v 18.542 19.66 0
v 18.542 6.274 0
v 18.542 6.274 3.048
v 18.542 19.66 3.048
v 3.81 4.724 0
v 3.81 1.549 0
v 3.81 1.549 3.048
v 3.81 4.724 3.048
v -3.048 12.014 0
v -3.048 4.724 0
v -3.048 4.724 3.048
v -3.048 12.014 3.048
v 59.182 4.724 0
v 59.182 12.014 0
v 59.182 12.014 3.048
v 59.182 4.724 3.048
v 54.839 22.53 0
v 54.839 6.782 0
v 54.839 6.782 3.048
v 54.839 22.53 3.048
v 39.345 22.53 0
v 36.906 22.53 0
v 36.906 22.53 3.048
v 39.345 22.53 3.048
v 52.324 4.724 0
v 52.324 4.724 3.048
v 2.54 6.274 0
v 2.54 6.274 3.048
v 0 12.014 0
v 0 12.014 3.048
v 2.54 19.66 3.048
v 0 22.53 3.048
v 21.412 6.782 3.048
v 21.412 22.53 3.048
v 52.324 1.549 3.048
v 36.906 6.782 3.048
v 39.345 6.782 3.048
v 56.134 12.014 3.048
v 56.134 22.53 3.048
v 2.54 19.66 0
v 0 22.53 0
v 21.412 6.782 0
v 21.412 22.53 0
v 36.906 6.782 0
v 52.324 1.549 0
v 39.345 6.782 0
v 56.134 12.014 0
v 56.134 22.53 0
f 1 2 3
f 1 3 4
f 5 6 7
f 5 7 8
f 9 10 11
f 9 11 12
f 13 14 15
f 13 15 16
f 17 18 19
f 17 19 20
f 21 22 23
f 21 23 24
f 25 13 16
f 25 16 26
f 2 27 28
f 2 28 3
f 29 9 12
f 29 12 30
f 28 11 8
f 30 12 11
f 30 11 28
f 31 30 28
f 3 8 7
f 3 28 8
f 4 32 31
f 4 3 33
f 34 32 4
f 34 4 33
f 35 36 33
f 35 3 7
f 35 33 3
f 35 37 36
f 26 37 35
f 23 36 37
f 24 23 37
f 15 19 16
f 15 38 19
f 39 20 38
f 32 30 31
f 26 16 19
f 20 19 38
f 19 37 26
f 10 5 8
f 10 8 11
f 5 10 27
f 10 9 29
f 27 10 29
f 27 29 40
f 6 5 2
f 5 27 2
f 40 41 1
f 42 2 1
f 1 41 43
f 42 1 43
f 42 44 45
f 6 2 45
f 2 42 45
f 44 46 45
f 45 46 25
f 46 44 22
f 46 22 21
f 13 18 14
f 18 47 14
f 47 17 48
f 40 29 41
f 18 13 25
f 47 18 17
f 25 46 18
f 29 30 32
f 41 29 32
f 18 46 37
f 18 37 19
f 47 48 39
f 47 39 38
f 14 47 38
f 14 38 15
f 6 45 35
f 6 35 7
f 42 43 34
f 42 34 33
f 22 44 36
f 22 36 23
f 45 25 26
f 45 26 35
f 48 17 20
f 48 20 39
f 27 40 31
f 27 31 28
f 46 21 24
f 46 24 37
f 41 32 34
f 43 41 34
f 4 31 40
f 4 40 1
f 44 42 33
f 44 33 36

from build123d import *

# Parameters (mm, degrees)
BOSS_EXTRUDE1_DEPTH = 3.048
SKETCH2_W           = 18.542
SKETCH2_H           = 2.8702
BOSS_EXTRUDE2_DEPTH = 3.048


with BuildPart() as part:
    # Sketch1 → Boss-Extrude1 (new body)
    with BuildSketch(Plane.XY):
        Polygon((-3.048, 12.0142), (0, 12.0142), (0, 19.6596), (2.54, 19.6596), (2.54, 6.2738), (18.542, 6.2738), (18.542, 22.5298), (21.4122, 22.5298), (21.4122, 6.7818), (36.9062, 6.7818), (36.9062, 22.5298), (39.3446, 22.5298), (39.3446, 6.7818), (54.8386, 6.7818), (54.8386, 22.5298), (56.134, 22.5298), (56.134, 12.0142), (59.182, 12.0142), (59.182, 4.7244), (52.324, 4.7244), (52.324, 1.5494), (3.81, 1.5494), (3.81, 4.7244), (-3.048, 4.7244), align=None)
    extrude(amount=BOSS_EXTRUDE1_DEPTH)

    # Sketch2 → Boss-Extrude2 (add)
    with BuildSketch(Plane.XY.offset(3.048)):
        with Locations((9.271, 21.0947)):
            Rectangle(SKETCH2_W, SKETCH2_H)
    extrude(amount=-BOSS_EXTRUDE2_DEPTH)


solid = part.part
